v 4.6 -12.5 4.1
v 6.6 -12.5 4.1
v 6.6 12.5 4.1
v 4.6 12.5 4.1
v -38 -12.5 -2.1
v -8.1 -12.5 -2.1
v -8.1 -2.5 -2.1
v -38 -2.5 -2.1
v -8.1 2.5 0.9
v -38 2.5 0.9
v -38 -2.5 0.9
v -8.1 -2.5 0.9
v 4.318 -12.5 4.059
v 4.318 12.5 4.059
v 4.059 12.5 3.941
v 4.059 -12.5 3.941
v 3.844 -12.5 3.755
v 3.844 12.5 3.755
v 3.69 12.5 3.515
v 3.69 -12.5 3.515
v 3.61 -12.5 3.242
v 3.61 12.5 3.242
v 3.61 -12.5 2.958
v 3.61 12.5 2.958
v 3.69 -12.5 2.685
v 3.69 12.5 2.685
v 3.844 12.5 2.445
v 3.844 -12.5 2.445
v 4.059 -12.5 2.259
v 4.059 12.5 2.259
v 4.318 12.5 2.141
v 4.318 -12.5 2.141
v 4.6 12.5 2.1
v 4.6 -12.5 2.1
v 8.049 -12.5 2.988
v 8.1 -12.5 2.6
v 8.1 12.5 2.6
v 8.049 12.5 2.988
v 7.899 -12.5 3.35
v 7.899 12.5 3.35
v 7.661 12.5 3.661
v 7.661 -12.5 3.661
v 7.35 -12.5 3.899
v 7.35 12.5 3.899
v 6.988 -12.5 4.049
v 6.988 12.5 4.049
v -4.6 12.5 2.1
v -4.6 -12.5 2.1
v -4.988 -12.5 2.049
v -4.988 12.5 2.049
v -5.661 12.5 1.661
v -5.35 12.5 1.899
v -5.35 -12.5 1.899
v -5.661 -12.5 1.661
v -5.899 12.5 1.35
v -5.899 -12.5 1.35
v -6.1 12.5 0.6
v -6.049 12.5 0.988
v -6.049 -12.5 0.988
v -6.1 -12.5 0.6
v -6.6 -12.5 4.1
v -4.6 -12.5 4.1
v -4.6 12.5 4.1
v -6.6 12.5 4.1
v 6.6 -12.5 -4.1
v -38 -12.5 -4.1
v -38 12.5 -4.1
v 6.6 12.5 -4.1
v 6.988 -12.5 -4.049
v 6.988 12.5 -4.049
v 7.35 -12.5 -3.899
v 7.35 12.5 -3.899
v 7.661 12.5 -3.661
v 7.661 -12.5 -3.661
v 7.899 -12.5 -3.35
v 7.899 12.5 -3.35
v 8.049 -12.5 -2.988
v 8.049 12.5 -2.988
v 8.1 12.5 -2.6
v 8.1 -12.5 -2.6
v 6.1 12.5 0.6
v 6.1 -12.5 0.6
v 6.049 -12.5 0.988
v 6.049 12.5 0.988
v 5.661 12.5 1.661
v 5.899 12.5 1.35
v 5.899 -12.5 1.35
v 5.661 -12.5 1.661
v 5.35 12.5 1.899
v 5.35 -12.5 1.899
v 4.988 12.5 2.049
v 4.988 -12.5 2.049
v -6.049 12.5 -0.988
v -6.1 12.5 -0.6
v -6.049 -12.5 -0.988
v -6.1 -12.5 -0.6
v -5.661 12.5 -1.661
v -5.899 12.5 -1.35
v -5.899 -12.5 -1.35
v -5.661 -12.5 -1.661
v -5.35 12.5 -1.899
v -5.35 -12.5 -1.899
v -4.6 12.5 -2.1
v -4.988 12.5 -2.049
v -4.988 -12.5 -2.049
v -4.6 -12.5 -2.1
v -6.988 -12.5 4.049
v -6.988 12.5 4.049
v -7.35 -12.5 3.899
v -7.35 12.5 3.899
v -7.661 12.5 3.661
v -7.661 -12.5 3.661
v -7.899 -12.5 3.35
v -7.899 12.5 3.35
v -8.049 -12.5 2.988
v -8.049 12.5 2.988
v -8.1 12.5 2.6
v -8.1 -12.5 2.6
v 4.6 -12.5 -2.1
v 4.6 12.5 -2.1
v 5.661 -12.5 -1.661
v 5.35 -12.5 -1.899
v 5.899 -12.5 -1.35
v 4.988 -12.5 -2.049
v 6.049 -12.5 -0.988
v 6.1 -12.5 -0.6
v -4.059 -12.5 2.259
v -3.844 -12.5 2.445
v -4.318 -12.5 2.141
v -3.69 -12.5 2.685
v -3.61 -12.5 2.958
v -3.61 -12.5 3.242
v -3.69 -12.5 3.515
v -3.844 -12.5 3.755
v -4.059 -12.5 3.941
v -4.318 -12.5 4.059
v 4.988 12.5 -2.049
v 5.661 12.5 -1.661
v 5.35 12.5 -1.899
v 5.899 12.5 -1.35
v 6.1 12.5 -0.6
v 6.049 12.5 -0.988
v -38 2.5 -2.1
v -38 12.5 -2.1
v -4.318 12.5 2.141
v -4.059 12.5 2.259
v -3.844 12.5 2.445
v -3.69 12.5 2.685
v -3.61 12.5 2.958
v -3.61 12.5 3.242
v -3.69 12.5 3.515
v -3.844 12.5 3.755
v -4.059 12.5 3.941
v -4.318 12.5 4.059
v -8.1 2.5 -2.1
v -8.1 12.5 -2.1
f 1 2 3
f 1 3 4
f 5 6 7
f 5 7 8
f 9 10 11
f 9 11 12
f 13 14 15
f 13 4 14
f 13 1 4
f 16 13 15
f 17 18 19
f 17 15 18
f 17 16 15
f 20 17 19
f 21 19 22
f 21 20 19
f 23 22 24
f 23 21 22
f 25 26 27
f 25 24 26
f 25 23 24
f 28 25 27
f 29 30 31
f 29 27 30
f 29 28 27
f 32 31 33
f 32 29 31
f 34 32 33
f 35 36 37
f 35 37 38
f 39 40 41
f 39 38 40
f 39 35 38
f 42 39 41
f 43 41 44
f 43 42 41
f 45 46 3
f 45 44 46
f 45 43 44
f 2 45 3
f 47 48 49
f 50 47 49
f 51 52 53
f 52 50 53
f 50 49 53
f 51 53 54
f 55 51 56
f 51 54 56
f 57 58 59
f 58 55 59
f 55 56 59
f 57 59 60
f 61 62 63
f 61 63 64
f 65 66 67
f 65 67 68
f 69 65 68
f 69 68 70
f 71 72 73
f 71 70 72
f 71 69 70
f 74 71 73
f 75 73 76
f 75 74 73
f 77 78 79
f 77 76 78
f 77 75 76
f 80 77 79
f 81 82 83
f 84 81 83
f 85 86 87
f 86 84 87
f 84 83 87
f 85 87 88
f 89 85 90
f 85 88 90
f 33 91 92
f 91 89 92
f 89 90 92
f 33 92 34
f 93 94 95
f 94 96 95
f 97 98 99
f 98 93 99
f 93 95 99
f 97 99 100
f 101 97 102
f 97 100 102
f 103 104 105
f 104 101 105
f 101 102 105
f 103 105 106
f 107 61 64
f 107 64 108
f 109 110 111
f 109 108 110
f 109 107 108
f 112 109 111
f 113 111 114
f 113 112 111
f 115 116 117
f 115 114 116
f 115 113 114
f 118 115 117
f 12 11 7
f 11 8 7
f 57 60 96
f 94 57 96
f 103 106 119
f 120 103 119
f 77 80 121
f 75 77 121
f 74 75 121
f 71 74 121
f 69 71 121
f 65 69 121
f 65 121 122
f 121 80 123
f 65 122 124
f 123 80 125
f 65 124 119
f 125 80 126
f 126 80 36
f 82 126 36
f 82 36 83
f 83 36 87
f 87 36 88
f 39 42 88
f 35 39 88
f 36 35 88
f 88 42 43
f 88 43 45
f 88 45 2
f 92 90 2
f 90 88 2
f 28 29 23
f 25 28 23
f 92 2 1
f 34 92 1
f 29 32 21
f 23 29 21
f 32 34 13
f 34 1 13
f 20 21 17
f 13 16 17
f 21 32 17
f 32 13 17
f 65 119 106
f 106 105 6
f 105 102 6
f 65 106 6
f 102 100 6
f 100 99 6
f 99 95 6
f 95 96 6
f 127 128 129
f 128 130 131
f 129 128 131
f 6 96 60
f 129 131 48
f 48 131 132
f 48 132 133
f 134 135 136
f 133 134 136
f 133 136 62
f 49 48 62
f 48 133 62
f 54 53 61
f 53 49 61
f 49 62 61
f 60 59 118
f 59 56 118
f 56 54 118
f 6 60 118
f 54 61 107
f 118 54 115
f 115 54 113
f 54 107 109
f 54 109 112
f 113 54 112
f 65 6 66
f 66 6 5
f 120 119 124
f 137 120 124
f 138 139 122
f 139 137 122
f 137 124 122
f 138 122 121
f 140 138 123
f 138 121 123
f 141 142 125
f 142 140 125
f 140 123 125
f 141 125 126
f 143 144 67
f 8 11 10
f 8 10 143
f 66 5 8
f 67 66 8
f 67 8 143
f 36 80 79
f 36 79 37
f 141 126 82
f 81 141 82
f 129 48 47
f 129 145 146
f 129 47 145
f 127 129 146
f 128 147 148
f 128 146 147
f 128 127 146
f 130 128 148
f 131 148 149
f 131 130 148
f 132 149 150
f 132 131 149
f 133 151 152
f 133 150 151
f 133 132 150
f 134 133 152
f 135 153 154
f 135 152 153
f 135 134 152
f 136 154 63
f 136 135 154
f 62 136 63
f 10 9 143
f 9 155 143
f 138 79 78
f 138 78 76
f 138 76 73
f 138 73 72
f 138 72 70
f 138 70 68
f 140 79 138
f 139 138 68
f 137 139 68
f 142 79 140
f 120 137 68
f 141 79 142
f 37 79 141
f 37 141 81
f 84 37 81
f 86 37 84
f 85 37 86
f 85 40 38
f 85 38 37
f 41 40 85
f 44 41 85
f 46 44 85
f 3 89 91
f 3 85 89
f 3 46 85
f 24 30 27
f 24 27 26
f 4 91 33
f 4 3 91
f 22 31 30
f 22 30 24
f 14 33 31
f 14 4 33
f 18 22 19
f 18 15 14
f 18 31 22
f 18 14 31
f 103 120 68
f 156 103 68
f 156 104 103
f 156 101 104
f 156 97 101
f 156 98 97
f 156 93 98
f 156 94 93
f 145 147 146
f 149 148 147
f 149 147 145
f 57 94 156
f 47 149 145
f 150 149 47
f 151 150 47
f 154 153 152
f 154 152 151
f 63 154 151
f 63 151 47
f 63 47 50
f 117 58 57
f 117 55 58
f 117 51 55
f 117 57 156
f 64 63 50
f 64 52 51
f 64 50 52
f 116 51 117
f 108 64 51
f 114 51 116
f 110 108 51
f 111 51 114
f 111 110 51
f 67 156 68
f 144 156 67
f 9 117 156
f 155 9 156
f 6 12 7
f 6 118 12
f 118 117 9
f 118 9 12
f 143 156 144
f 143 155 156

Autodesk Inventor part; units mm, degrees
ref_plane "YZ Plane" through (0, 0, 0) normal (1, 0, 0) x (0, 1, 0)
ref_plane "XZ Plane" through (0, 0, 0) normal (0, 1, 0) x (-1, 0, 0)
ref_plane "XY Plane" through (0, 0, 0) normal (0, 0, 1) x (1, 0, 0)
sketch "Hook_Base_Skt" plane through (0, 0, 0) normal (0, 1, 0) x (-1, 0, 0)
  line L0 (4.6, -2.1) -> (-4.6, -2.1)
  line L1 (-6.1, -0.6) -> (-6.1, 0.6)
  line L2 (-4.6, 2.1) -> (4.6, 2.1) construction
  line L3 (6.1, 0.6) -> (6.1, -0.6)
  line L4 (6.1, -2.1) -> (-6.1, 2.1) construction
  line L5 (-6.1, -2.1) -> (6.1, 2.1) construction
  line L6 (8.1, -4.1) -> (-6.6, -4.1)
  line L7 (-8.1, -2.6) -> (-8.1, 2.6)
  line L8 (-6.6, 4.1) -> (-4.6, 4.1)
  line L9 (8.1, 2.6) -> (8.1, -4.1)
  line L10 (8.1, -4.1) -> (-8.1, 4.1) construction
  line L11 (-8.1, -4.1) -> (8.1, 4.1) construction
  arc A0 (6.1, 0.6) -> (4.6, 2.1) centre (4.6, 0.6) ccw
  arc A1 (4.6, -2.1) -> (6.1, -0.6) centre (4.6, -0.6) ccw
  arc A2 (-6.1, -0.6) -> (-4.6, -2.1) centre (-4.6, -0.6) ccw
  arc A3 (-4.6, 2.1) -> (-6.1, 0.6) centre (-4.6, 0.6) ccw
  arc A4 (8.1, 2.6) -> (6.6, 4.1) centre (6.6, 2.6) ccw
  arc A5 (-6.6, 4.1) -> (-8.1, 2.6) centre (-6.6, 2.6) ccw
  arc A6 (-8.1, -2.6) -> (-6.6, -4.1) centre (-6.6, -2.6) ccw
  arc A7 (4.6, 4.1) -> (4.6, 2.1) centre (4.6, 3.1) ccw
  arc A8 (-4.6, 2.1) -> (-4.6, 4.1) centre (-4.6, 3.1) ccw
  line L12 (4.6, 4.1) -> (6.6, 4.1)
  line L13 (-4.6, 4.1) -> (4.6, 4.1) construction
  point P0 (0, 0)
  dimension "d29" = 12.2
  dimension "d30" = 4.2
  dimension "d31" = 2
  dimension "d32" = 2
  dimension "d34" = 1.5
extrude "Hook_Base" add sketch "Hook_Base_Skt" along normal mid plane 25
sketch "Arm_Skt" plane through (0, -12.5, 0) normal (0, -1, 0) x (1, 0, 0)
  line L0 (4.6, -2.1) -> (-4.6, -2.1) projected
  line L1 (0, -2.1) -> (-38, -2.1)
  line L2 (-38, -2.1) -> (-38, -4.1)
  line L3 (-38, -4.1) -> (0, -4.1)
  line L4 (6.6, -4.1) -> (-8.1, -4.1) projected
  line L5 (0, -4.1) -> (0, -2.1)
  point P0 (0, 0)
  dimension "d35" = 38
extrude "Arm" add sketch "Arm_Skt" against normal up to surface (25 mm away) from surface at 0
sketch "Arm_Rib_Skt" plane through (-38, -12.5, -2.1) normal (0, 0, 1) x (1, 0, 0)
  line L0 (38, 12.5) -> (0, 12.5) construction
  line L1 (0, 25) -> (0, 0) construction
  line L2 (29.9, 25) -> (29.9, 0) projected
  line L3 (0, 10) -> (29.9, 10)
  line L4 (29.9, 10) -> (29.9, 15)
  line L5 (29.9, 15) -> (0, 15)
  line L6 (0, 15) -> (0, 10)
  line L7 (0, 25) -> (0, 0) projected
  point P0 (0, 12.5)
  dimension "d38" = 5
extrude "Arm_Rib" add sketch "Arm_Rib_Skt" along normal blind 3
equation "\"d29\" = arm_width + 2 * clearance"
equation "\"d30\" = arm_thick + 2 * clearance"
equation "\"d31\" = hook_thick"
equation "\"d32\" = hook_thick"
equation "\"d34\" = general_fillet"
equation "\"d13\" = hook_width"
equation "\"d35\" = hole_to_border"
equation "\"d38\" = 0.2 * hook_width"
equation "\"d39\" = 1.5 * hook_thick"
equation "\"clearance\" = 0.1"
equation "\"arm_angle\" = 70deg"
equation "\"hole_diam\" = 3.1"
equation "\"hole_h_space\" = 126.2"
equation "\"hole_v_space\" = 65.65"
equation "\"arm_width\" = 12"
equation "\"arm_thick\" = 4"
equation "\"arm_rib_space\" = 1.25"
equation "\"arm_rib_thick\" = 2"
equation "\"base_width\" = 53"
equation "\"base_lenght\" = 138.2"
equation "\"general_fillet\" = 1.5"
equation "\"hole_to_border\" = 38"
equation "\"hook_width\" = 25"
equation "\"hook_thick\" = 2"
equation "\"rfid_width\" = 39.5"
equation "\"rfid_pin_border\" = 8"
equation "\"rfid_pin_width\" = 5"
equation "\"rfid_screw_h\" = 2.5"
equation "\"rfid_screw_v\" = 15.5"
equation "\"rfid_screw_diam\" = 3.1"
equation "\"rfid_clock_pad\" = 3"
equation "\"rfid_clock_h\" = 4.5"
equation "\"rfid_clock_v\" = 8.5"
equation "\"rfid_clock_thick\" = 1.5"
equation "\"finger_width\" = 21"
equation "\"finger_claw_h\" = 8"
equation "\"finger_claw_pad\" = 14"
equation "\"finger_claw_v\" = 7.3"
equation "\"finger_claw_clip\" = 2"
equation "\"finger_claw_ramp\" = 1"
properties part number "Sensor_Hook"
